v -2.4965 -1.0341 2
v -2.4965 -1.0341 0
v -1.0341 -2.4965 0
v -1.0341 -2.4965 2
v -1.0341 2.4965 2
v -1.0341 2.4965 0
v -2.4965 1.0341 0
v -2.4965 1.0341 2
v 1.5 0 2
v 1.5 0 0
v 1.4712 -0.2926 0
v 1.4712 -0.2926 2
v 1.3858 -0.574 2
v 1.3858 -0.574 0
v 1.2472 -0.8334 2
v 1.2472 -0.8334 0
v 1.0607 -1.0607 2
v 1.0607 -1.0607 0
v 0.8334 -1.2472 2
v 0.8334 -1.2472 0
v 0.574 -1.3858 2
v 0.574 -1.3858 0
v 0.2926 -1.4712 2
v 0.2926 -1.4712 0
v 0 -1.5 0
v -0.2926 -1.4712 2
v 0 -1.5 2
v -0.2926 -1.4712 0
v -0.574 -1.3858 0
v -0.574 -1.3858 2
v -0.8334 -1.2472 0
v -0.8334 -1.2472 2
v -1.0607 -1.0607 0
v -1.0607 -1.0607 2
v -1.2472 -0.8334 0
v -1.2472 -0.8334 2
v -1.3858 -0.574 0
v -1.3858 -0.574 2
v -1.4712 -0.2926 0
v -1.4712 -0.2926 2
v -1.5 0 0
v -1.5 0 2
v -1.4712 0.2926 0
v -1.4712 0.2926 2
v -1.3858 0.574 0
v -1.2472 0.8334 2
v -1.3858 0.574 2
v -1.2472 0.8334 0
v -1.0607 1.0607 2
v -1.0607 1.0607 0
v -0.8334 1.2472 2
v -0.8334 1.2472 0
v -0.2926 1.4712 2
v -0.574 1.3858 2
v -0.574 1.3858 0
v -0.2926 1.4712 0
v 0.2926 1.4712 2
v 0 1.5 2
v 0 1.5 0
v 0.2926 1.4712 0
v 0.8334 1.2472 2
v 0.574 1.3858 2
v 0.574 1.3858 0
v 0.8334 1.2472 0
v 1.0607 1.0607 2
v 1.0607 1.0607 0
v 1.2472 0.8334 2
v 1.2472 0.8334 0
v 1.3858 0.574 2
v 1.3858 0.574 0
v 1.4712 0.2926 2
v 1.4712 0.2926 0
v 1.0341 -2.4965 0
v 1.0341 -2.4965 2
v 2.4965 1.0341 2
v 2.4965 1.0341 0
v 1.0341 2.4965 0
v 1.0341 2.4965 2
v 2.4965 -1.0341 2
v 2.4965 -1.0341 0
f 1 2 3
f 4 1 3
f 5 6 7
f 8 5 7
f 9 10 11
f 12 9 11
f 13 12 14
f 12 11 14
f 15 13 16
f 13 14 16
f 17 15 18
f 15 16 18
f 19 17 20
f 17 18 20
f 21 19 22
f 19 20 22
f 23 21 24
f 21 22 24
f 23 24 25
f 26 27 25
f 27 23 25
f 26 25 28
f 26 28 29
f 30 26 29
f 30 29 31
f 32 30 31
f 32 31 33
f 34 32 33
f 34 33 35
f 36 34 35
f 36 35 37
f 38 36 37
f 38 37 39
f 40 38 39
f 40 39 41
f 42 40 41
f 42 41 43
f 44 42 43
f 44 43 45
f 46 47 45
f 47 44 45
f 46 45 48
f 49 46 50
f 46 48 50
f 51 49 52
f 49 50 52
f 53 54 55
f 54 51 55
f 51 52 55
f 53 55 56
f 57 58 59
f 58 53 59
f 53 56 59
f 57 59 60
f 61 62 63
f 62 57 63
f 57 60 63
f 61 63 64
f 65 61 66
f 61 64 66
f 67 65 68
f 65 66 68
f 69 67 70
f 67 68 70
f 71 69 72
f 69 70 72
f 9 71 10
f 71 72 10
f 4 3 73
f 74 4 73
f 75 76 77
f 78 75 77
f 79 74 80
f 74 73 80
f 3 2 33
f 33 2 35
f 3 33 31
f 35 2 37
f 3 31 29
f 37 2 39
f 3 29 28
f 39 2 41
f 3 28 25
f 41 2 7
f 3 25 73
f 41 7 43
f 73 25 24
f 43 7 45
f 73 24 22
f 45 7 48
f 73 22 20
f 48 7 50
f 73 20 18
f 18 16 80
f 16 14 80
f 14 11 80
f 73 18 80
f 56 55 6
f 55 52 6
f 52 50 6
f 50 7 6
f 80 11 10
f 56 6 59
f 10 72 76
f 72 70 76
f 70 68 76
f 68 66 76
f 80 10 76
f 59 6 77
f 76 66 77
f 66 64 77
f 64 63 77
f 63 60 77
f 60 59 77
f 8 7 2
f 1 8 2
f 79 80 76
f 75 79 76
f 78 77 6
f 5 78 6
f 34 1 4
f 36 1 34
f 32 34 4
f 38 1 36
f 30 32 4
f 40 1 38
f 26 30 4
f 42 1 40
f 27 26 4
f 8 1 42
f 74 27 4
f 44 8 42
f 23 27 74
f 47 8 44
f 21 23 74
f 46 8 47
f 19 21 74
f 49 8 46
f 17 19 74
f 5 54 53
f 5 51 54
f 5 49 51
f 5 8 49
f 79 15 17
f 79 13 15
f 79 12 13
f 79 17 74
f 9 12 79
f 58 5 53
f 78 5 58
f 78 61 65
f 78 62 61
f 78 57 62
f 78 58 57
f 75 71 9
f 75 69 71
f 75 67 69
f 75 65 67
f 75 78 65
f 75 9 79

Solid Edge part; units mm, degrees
sketch "Sketch1" plane through (0, 0, 0) normal (0, 0, 1) x (1, 0, 0)
  circle A0 centre (0, 0) radius 1.5
  line L0 (-1.0341, 2.4965) -> (-2.4965, 1.0341)
  line L1 (-2.4965, 1.0341) -> (-2.4965, -1.0341)
  line L2 (-2.4965, -1.0341) -> (-1.0341, -2.4965)
  line L3 (-1.0341, -2.4965) -> (1.0341, -2.4965)
  line L4 (1.0341, -2.4965) -> (2.4965, -1.0341)
  line L5 (2.4965, -1.0341) -> (2.4965, 1.0341)
  line L6 (2.4965, 1.0341) -> (1.0341, 2.4965)
  line L7 (1.0341, 2.4965) -> (-1.0341, 2.4965)
extrude "Protrusion1" add sketch "Sketch1" along normal blind 2
properties material "Steel"
